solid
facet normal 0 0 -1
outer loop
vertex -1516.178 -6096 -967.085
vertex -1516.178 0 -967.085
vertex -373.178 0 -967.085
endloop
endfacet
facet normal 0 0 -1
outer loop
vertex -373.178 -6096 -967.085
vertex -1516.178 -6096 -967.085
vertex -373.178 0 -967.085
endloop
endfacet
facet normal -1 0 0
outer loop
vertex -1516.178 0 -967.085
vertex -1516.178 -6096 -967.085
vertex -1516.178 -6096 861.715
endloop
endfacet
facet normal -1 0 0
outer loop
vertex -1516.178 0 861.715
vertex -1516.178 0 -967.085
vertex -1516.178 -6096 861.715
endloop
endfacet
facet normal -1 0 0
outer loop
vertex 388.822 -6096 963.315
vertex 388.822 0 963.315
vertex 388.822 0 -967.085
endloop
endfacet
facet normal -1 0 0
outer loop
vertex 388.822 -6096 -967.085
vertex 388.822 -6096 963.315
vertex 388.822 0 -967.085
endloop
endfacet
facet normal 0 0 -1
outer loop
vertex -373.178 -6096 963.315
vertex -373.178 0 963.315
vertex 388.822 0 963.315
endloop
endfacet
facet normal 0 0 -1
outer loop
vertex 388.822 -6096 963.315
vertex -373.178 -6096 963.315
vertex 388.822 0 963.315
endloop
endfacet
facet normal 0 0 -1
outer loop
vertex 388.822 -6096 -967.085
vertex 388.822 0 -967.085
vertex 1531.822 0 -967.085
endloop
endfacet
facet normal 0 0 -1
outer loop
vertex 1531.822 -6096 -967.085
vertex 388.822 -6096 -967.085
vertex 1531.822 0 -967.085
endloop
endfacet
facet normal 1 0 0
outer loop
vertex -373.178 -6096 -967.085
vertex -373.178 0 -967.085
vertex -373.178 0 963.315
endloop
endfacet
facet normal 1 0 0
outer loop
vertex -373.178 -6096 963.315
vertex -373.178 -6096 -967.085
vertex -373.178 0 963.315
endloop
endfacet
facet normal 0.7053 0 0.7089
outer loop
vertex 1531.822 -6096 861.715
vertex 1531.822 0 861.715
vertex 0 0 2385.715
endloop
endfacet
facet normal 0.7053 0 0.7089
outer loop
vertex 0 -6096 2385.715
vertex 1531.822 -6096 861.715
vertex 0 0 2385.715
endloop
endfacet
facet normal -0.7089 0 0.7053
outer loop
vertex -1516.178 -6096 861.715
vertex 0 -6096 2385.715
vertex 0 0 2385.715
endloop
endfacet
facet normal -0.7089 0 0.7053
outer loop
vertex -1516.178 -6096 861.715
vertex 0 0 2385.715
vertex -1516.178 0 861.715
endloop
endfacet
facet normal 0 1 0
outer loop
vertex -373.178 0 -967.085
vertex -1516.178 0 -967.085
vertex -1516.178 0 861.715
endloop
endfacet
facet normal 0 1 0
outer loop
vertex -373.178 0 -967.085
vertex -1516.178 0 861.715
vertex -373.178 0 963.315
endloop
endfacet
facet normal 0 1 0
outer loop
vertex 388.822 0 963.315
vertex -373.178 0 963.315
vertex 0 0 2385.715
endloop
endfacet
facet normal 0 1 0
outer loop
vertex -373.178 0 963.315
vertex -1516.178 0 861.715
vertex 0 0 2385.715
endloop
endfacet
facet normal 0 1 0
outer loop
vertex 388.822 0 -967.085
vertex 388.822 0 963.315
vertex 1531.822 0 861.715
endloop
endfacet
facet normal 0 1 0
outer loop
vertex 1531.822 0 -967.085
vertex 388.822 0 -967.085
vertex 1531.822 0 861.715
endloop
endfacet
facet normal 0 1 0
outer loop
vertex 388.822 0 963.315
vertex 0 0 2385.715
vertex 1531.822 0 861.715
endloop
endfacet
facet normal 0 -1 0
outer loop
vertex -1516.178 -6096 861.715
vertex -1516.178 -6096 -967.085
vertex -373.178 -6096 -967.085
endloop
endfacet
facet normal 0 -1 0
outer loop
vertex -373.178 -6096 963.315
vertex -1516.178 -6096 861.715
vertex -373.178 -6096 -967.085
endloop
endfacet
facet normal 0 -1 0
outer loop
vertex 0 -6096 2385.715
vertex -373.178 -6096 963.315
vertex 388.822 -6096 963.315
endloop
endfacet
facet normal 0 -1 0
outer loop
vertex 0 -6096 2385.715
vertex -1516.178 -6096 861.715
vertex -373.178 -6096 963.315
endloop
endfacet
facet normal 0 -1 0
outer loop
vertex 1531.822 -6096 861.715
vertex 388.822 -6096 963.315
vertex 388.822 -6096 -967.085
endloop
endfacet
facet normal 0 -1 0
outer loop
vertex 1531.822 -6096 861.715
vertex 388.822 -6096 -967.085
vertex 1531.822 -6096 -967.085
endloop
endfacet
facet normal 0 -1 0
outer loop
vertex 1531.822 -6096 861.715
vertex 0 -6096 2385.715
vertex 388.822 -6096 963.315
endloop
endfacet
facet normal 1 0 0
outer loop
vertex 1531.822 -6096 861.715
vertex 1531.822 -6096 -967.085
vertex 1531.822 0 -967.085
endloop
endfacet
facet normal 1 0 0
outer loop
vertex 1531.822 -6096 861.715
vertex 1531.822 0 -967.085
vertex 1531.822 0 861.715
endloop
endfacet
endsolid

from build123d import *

# Parameters (mm, degrees)
F0_W     = 1143
F0_H     = 1828.8
F1_DEPTH = 6096


with BuildPart() as f1:
    # F0 (on Front) → F1 (new body)
    with BuildSketch(Plane.XZ):
        with Locations((-944.678062, -52.685231)):
            Rectangle(F0_W, F0_H)
        with Locations((960.321938, -52.685231)):
            Rectangle(F0_W, F0_H)
        Polygon((0, 2385.714769), (-1516.178062, 861.714769), (-373.178062, 861.714769), (-373.178062, 963.314769), (0, 963.314769), align=None)
        Polygon((1531.821938, 861.714769), (0, 2385.714769), (0, 963.314769), (7.821938, 963.314769), (388.821938, 963.314769), (388.821938, 861.714769), align=None)
    extrude(amount=F1_DEPTH)


solid = f1.part
